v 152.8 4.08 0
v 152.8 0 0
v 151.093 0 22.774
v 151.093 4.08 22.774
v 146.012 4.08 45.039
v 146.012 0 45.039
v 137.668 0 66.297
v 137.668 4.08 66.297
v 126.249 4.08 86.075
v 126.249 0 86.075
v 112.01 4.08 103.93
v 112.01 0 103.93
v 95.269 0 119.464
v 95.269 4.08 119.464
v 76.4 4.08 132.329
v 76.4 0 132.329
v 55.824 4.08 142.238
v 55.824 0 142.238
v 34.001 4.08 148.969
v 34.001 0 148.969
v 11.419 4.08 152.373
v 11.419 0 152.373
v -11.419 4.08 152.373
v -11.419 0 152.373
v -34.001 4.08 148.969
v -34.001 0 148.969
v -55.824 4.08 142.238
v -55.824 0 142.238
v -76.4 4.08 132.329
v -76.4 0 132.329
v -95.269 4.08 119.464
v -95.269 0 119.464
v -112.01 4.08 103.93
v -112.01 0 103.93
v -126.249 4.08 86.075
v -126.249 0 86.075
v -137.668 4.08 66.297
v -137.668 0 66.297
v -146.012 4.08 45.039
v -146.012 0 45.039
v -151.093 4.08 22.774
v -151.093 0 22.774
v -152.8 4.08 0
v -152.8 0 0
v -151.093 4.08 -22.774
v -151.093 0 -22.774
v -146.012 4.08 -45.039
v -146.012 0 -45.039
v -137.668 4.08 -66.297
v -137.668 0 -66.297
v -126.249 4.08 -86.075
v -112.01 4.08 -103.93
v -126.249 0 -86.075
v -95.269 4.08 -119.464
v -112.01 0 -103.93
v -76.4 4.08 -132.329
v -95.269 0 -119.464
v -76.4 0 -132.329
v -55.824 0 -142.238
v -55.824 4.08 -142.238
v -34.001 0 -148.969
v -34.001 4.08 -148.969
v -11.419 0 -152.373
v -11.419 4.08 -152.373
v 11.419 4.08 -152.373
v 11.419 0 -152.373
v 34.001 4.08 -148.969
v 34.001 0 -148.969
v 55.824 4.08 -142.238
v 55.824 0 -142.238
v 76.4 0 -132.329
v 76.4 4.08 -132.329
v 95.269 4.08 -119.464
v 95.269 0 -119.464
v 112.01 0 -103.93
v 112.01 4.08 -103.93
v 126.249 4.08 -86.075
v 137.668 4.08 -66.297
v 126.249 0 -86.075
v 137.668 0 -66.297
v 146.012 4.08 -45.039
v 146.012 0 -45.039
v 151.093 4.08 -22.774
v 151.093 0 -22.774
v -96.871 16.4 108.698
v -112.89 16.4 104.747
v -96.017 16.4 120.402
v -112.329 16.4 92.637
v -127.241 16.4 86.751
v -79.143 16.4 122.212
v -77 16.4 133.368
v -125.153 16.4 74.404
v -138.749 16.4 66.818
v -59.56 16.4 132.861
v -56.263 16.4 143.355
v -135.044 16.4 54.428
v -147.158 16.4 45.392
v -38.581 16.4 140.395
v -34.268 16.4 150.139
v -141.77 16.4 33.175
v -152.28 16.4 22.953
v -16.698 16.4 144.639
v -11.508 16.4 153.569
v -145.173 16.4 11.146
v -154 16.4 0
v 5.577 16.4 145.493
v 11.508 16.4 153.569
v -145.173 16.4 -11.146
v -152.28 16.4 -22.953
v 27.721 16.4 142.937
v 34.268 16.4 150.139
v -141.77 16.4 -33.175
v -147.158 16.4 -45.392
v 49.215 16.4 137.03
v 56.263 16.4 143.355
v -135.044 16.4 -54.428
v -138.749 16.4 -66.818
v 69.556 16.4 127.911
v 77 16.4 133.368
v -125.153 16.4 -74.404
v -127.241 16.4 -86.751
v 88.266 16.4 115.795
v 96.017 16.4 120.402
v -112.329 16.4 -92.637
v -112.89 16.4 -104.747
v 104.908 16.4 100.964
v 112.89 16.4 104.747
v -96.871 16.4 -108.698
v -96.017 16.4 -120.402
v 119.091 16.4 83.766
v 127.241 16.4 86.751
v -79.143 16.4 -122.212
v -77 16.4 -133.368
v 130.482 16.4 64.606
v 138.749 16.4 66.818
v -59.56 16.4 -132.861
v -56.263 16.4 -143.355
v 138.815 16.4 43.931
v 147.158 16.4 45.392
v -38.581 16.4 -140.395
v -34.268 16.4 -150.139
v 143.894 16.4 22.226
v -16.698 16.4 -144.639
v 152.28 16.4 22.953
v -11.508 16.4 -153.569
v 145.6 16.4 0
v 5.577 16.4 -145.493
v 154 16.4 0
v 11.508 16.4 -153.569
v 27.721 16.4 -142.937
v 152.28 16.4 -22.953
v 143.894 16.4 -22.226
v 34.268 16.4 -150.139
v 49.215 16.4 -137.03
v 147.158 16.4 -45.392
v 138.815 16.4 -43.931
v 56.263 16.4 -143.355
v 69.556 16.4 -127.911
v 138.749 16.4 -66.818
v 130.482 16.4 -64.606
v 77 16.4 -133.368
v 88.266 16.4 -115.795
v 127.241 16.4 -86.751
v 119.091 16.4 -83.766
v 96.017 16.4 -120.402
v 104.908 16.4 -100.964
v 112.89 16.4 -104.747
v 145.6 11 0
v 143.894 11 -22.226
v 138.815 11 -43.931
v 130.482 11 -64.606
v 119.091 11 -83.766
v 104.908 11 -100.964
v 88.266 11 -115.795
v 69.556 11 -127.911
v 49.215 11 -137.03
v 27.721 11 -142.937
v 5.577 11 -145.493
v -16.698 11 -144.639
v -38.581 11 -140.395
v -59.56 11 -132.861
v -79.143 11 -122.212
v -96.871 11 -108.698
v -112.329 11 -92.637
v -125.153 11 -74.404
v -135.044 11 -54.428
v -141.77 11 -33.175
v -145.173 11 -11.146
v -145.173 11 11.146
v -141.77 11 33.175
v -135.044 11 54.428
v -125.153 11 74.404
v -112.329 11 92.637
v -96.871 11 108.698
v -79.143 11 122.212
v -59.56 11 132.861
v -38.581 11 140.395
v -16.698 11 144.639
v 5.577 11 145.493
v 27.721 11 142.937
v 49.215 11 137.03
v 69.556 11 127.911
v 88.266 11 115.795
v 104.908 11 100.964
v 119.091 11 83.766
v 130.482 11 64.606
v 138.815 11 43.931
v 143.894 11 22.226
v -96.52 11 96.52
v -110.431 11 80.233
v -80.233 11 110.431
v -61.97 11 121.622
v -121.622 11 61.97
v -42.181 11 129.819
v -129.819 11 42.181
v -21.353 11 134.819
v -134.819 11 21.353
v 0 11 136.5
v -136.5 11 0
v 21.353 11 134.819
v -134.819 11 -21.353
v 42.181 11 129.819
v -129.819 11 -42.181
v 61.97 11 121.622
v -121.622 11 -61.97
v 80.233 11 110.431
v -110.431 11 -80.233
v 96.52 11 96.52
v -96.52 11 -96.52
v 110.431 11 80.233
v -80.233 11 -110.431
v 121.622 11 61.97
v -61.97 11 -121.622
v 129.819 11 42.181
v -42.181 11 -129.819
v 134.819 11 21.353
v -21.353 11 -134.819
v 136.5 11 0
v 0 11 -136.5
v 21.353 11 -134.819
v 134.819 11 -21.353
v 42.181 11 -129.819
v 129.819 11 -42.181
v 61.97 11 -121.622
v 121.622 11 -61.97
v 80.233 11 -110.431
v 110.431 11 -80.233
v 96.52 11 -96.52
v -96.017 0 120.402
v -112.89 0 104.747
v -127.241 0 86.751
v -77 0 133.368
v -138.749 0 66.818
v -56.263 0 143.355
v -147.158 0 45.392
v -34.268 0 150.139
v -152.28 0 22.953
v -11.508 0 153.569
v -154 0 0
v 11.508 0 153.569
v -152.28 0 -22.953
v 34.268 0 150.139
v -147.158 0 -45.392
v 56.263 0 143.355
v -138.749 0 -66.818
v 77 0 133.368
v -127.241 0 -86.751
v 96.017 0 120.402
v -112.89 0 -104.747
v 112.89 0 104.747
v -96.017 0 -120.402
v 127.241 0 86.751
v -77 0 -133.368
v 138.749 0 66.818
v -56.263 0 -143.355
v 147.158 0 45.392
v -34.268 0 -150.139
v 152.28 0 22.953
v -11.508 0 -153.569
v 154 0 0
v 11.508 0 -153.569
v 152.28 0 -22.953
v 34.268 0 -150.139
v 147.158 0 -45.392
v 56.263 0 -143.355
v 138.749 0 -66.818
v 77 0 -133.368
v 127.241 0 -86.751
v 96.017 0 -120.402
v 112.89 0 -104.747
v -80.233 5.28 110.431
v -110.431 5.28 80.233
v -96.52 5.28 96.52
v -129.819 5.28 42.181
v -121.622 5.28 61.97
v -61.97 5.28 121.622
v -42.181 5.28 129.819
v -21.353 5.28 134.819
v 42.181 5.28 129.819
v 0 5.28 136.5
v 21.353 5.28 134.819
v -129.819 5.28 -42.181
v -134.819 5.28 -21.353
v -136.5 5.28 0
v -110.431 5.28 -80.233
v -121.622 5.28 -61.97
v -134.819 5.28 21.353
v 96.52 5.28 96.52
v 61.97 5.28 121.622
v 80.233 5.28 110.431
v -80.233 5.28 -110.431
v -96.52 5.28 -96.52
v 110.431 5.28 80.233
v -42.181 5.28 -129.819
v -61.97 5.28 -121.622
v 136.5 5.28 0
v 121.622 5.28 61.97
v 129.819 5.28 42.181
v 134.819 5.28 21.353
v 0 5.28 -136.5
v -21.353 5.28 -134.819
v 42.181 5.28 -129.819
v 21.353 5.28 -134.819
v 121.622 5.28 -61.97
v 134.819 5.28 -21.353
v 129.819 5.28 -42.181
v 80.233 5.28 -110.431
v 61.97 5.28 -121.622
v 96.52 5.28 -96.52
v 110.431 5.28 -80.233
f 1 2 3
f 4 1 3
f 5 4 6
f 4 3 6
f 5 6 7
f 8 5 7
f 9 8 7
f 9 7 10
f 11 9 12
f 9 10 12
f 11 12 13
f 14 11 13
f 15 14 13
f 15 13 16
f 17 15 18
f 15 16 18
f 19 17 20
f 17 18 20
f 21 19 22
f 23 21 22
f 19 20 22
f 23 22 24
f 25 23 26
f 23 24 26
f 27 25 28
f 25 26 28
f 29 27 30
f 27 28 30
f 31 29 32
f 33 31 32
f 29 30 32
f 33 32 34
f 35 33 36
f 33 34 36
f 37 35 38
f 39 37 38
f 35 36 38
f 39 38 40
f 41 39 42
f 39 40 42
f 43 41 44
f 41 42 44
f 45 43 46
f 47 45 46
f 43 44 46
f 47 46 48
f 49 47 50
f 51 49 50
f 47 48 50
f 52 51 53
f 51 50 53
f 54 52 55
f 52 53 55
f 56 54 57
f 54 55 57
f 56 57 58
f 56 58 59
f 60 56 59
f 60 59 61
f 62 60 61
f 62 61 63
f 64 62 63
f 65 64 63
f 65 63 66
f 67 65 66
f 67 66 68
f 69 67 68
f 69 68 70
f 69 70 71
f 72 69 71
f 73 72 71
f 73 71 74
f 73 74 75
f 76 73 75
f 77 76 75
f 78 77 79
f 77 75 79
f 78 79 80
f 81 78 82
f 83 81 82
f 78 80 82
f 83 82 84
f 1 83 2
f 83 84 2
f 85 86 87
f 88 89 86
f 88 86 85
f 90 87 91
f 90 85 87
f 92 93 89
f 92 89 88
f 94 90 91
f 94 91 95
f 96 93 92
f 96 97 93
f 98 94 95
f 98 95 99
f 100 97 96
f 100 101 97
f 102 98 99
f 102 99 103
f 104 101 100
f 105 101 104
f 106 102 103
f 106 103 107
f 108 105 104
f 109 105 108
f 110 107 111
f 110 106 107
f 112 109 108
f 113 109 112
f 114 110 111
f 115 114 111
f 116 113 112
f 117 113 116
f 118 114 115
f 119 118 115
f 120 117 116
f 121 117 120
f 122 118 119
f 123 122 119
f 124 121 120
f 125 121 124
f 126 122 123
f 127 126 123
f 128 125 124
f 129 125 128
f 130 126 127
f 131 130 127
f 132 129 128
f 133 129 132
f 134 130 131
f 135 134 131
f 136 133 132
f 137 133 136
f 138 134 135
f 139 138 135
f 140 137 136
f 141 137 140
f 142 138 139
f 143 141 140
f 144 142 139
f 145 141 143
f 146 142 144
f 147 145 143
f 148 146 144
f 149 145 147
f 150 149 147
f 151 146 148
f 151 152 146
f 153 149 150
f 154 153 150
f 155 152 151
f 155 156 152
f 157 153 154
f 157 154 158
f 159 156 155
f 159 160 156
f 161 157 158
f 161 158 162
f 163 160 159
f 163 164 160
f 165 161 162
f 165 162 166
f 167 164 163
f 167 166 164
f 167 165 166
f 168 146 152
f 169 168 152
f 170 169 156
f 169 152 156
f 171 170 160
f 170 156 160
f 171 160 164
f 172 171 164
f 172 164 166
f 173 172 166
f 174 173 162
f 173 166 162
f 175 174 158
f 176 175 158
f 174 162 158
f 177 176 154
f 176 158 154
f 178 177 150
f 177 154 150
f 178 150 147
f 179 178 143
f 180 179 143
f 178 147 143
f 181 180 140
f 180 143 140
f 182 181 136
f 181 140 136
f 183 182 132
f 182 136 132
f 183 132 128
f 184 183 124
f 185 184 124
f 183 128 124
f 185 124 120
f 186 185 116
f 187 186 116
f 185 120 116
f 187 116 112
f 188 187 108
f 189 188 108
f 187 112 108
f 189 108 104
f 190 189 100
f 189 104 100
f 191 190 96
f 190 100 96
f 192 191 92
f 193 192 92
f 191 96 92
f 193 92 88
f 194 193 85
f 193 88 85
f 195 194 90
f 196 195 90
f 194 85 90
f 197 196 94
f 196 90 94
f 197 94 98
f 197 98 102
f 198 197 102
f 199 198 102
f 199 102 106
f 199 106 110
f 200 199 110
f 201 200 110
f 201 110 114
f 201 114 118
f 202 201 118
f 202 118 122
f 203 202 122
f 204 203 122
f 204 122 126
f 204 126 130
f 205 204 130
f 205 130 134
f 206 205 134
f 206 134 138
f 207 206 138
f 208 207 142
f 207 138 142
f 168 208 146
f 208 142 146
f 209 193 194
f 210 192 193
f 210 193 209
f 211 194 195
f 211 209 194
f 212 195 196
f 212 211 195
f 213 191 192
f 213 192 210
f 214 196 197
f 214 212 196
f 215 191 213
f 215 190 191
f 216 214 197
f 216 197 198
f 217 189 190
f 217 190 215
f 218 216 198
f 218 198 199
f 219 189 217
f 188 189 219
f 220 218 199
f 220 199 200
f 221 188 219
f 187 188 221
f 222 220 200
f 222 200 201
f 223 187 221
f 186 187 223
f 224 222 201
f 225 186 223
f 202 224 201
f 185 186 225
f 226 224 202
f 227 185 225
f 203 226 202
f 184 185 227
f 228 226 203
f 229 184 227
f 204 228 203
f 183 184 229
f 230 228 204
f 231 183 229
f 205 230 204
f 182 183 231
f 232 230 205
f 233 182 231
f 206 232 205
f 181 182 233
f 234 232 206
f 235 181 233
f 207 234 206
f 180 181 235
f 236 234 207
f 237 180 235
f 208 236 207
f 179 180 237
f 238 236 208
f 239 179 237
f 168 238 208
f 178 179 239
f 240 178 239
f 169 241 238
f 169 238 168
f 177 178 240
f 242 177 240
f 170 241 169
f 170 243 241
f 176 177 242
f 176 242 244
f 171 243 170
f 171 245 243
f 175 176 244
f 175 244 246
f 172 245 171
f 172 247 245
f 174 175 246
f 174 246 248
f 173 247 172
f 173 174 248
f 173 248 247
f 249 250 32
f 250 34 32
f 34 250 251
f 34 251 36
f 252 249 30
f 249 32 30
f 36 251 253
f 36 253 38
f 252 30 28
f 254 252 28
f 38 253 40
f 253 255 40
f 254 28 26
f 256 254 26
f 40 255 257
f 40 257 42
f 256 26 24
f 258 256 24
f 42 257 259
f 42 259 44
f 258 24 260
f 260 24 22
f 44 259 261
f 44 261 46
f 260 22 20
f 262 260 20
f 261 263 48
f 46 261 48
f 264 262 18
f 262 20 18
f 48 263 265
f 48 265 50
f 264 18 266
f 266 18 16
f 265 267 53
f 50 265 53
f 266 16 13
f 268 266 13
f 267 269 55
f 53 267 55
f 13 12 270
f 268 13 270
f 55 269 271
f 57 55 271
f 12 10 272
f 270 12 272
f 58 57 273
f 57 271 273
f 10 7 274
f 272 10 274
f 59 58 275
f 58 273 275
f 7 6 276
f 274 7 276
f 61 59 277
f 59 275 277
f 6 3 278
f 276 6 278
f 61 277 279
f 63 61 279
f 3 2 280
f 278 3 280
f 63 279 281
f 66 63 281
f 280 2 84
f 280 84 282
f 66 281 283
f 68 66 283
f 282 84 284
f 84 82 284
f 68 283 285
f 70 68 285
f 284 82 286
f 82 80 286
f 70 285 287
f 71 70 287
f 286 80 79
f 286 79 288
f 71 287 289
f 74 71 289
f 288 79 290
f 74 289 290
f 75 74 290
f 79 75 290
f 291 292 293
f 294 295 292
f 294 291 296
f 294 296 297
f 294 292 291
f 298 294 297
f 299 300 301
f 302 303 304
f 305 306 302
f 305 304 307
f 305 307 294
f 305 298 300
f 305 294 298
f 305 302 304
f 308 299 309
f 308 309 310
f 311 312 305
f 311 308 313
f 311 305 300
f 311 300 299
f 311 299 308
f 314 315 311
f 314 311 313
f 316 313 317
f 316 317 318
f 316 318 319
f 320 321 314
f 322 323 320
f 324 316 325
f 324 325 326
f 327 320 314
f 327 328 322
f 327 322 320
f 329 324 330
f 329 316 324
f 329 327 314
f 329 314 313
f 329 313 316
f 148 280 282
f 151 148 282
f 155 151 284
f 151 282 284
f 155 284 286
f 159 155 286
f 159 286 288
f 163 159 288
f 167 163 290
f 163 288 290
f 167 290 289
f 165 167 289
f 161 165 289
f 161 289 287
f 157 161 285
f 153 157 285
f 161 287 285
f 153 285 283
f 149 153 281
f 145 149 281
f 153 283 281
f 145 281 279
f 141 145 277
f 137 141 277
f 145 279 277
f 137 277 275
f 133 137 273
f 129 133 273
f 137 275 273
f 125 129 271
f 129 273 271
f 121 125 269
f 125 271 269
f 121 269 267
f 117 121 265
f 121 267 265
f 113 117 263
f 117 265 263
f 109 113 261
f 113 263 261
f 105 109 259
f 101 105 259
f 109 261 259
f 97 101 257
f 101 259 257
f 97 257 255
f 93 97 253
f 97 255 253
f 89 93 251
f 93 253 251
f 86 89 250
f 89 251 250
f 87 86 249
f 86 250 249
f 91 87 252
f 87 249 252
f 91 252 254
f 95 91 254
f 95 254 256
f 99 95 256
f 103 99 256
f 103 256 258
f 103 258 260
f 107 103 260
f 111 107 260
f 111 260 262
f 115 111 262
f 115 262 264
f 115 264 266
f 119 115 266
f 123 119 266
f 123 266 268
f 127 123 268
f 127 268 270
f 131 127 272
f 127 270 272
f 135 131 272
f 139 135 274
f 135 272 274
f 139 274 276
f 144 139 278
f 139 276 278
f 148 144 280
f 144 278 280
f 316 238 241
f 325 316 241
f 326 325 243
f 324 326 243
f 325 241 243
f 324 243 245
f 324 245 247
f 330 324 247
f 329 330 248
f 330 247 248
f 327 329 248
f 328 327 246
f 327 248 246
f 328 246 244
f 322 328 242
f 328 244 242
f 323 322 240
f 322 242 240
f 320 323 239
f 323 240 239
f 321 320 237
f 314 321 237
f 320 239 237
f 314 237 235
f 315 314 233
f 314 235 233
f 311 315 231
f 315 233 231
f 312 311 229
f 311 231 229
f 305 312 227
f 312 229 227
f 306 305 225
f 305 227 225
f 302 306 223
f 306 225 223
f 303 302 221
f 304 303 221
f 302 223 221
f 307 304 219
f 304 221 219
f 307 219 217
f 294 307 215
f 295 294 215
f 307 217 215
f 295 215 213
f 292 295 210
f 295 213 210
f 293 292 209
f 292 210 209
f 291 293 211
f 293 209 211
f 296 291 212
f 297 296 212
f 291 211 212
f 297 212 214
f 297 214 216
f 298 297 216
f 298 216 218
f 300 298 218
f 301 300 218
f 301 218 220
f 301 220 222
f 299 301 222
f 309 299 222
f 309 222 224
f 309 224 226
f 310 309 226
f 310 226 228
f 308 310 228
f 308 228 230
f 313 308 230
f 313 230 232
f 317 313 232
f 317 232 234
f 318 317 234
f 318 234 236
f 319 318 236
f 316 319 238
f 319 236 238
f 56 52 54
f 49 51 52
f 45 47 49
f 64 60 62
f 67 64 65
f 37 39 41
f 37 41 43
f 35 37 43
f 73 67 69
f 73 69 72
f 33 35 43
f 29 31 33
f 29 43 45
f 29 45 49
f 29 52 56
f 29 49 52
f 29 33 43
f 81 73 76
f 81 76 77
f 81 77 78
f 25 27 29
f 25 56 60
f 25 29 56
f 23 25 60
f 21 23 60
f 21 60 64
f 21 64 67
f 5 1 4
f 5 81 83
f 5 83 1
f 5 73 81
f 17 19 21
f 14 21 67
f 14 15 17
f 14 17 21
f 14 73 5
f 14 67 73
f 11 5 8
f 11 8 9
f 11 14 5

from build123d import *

# Parameters (mm, degrees)
ESBO_O1_R                = 154
RESSALTO_EXTRUS_O1_DEPTH = 16.4
ESBO_O2_R                = 145.6
CORTE_EXTRUS_O1_DEPTH    = 5.4
ESBO_O3_R                = 136.5
CORTE_EXTRUS_O2_DEPTH    = 5.72
ESBO_O4_R                = 152.8
CORTE_EXTRUS_O5_DEPTH    = 4.08


with BuildPart() as part:
    # Esboço1 → Ressalto-extrusão1 (new body)
    with BuildSketch(Plane(origin=(0, 0, 0), x_dir=(1, 0, 0), z_dir=(0, 1, 0))):
        Circle(ESBO_O1_R)
    extrude(amount=RESSALTO_EXTRUS_O1_DEPTH)

    # Esboço2 → Corte-extrusão1 (cut)
    with BuildSketch(Plane(origin=(0, 16.4, 0), x_dir=(1, 0, 0), z_dir=(0, 1, 0))):
        Circle(ESBO_O2_R)
    extrude(amount=-CORTE_EXTRUS_O1_DEPTH, mode=Mode.SUBTRACT)

    # Esboço3 → Corte-extrusão2 (cut)
    with BuildSketch(Plane(origin=(0, 11, 0), x_dir=(1, 0, 0), z_dir=(0, 1, 0))):
        Circle(ESBO_O3_R)
    extrude(amount=-CORTE_EXTRUS_O2_DEPTH, mode=Mode.SUBTRACT)

    # Esboço4 → Corte-extrusão5 (cut)
    with BuildSketch(Plane.XZ):
        Circle(ESBO_O4_R)
    extrude(amount=-CORTE_EXTRUS_O5_DEPTH, mode=Mode.SUBTRACT)


solid = part.part
